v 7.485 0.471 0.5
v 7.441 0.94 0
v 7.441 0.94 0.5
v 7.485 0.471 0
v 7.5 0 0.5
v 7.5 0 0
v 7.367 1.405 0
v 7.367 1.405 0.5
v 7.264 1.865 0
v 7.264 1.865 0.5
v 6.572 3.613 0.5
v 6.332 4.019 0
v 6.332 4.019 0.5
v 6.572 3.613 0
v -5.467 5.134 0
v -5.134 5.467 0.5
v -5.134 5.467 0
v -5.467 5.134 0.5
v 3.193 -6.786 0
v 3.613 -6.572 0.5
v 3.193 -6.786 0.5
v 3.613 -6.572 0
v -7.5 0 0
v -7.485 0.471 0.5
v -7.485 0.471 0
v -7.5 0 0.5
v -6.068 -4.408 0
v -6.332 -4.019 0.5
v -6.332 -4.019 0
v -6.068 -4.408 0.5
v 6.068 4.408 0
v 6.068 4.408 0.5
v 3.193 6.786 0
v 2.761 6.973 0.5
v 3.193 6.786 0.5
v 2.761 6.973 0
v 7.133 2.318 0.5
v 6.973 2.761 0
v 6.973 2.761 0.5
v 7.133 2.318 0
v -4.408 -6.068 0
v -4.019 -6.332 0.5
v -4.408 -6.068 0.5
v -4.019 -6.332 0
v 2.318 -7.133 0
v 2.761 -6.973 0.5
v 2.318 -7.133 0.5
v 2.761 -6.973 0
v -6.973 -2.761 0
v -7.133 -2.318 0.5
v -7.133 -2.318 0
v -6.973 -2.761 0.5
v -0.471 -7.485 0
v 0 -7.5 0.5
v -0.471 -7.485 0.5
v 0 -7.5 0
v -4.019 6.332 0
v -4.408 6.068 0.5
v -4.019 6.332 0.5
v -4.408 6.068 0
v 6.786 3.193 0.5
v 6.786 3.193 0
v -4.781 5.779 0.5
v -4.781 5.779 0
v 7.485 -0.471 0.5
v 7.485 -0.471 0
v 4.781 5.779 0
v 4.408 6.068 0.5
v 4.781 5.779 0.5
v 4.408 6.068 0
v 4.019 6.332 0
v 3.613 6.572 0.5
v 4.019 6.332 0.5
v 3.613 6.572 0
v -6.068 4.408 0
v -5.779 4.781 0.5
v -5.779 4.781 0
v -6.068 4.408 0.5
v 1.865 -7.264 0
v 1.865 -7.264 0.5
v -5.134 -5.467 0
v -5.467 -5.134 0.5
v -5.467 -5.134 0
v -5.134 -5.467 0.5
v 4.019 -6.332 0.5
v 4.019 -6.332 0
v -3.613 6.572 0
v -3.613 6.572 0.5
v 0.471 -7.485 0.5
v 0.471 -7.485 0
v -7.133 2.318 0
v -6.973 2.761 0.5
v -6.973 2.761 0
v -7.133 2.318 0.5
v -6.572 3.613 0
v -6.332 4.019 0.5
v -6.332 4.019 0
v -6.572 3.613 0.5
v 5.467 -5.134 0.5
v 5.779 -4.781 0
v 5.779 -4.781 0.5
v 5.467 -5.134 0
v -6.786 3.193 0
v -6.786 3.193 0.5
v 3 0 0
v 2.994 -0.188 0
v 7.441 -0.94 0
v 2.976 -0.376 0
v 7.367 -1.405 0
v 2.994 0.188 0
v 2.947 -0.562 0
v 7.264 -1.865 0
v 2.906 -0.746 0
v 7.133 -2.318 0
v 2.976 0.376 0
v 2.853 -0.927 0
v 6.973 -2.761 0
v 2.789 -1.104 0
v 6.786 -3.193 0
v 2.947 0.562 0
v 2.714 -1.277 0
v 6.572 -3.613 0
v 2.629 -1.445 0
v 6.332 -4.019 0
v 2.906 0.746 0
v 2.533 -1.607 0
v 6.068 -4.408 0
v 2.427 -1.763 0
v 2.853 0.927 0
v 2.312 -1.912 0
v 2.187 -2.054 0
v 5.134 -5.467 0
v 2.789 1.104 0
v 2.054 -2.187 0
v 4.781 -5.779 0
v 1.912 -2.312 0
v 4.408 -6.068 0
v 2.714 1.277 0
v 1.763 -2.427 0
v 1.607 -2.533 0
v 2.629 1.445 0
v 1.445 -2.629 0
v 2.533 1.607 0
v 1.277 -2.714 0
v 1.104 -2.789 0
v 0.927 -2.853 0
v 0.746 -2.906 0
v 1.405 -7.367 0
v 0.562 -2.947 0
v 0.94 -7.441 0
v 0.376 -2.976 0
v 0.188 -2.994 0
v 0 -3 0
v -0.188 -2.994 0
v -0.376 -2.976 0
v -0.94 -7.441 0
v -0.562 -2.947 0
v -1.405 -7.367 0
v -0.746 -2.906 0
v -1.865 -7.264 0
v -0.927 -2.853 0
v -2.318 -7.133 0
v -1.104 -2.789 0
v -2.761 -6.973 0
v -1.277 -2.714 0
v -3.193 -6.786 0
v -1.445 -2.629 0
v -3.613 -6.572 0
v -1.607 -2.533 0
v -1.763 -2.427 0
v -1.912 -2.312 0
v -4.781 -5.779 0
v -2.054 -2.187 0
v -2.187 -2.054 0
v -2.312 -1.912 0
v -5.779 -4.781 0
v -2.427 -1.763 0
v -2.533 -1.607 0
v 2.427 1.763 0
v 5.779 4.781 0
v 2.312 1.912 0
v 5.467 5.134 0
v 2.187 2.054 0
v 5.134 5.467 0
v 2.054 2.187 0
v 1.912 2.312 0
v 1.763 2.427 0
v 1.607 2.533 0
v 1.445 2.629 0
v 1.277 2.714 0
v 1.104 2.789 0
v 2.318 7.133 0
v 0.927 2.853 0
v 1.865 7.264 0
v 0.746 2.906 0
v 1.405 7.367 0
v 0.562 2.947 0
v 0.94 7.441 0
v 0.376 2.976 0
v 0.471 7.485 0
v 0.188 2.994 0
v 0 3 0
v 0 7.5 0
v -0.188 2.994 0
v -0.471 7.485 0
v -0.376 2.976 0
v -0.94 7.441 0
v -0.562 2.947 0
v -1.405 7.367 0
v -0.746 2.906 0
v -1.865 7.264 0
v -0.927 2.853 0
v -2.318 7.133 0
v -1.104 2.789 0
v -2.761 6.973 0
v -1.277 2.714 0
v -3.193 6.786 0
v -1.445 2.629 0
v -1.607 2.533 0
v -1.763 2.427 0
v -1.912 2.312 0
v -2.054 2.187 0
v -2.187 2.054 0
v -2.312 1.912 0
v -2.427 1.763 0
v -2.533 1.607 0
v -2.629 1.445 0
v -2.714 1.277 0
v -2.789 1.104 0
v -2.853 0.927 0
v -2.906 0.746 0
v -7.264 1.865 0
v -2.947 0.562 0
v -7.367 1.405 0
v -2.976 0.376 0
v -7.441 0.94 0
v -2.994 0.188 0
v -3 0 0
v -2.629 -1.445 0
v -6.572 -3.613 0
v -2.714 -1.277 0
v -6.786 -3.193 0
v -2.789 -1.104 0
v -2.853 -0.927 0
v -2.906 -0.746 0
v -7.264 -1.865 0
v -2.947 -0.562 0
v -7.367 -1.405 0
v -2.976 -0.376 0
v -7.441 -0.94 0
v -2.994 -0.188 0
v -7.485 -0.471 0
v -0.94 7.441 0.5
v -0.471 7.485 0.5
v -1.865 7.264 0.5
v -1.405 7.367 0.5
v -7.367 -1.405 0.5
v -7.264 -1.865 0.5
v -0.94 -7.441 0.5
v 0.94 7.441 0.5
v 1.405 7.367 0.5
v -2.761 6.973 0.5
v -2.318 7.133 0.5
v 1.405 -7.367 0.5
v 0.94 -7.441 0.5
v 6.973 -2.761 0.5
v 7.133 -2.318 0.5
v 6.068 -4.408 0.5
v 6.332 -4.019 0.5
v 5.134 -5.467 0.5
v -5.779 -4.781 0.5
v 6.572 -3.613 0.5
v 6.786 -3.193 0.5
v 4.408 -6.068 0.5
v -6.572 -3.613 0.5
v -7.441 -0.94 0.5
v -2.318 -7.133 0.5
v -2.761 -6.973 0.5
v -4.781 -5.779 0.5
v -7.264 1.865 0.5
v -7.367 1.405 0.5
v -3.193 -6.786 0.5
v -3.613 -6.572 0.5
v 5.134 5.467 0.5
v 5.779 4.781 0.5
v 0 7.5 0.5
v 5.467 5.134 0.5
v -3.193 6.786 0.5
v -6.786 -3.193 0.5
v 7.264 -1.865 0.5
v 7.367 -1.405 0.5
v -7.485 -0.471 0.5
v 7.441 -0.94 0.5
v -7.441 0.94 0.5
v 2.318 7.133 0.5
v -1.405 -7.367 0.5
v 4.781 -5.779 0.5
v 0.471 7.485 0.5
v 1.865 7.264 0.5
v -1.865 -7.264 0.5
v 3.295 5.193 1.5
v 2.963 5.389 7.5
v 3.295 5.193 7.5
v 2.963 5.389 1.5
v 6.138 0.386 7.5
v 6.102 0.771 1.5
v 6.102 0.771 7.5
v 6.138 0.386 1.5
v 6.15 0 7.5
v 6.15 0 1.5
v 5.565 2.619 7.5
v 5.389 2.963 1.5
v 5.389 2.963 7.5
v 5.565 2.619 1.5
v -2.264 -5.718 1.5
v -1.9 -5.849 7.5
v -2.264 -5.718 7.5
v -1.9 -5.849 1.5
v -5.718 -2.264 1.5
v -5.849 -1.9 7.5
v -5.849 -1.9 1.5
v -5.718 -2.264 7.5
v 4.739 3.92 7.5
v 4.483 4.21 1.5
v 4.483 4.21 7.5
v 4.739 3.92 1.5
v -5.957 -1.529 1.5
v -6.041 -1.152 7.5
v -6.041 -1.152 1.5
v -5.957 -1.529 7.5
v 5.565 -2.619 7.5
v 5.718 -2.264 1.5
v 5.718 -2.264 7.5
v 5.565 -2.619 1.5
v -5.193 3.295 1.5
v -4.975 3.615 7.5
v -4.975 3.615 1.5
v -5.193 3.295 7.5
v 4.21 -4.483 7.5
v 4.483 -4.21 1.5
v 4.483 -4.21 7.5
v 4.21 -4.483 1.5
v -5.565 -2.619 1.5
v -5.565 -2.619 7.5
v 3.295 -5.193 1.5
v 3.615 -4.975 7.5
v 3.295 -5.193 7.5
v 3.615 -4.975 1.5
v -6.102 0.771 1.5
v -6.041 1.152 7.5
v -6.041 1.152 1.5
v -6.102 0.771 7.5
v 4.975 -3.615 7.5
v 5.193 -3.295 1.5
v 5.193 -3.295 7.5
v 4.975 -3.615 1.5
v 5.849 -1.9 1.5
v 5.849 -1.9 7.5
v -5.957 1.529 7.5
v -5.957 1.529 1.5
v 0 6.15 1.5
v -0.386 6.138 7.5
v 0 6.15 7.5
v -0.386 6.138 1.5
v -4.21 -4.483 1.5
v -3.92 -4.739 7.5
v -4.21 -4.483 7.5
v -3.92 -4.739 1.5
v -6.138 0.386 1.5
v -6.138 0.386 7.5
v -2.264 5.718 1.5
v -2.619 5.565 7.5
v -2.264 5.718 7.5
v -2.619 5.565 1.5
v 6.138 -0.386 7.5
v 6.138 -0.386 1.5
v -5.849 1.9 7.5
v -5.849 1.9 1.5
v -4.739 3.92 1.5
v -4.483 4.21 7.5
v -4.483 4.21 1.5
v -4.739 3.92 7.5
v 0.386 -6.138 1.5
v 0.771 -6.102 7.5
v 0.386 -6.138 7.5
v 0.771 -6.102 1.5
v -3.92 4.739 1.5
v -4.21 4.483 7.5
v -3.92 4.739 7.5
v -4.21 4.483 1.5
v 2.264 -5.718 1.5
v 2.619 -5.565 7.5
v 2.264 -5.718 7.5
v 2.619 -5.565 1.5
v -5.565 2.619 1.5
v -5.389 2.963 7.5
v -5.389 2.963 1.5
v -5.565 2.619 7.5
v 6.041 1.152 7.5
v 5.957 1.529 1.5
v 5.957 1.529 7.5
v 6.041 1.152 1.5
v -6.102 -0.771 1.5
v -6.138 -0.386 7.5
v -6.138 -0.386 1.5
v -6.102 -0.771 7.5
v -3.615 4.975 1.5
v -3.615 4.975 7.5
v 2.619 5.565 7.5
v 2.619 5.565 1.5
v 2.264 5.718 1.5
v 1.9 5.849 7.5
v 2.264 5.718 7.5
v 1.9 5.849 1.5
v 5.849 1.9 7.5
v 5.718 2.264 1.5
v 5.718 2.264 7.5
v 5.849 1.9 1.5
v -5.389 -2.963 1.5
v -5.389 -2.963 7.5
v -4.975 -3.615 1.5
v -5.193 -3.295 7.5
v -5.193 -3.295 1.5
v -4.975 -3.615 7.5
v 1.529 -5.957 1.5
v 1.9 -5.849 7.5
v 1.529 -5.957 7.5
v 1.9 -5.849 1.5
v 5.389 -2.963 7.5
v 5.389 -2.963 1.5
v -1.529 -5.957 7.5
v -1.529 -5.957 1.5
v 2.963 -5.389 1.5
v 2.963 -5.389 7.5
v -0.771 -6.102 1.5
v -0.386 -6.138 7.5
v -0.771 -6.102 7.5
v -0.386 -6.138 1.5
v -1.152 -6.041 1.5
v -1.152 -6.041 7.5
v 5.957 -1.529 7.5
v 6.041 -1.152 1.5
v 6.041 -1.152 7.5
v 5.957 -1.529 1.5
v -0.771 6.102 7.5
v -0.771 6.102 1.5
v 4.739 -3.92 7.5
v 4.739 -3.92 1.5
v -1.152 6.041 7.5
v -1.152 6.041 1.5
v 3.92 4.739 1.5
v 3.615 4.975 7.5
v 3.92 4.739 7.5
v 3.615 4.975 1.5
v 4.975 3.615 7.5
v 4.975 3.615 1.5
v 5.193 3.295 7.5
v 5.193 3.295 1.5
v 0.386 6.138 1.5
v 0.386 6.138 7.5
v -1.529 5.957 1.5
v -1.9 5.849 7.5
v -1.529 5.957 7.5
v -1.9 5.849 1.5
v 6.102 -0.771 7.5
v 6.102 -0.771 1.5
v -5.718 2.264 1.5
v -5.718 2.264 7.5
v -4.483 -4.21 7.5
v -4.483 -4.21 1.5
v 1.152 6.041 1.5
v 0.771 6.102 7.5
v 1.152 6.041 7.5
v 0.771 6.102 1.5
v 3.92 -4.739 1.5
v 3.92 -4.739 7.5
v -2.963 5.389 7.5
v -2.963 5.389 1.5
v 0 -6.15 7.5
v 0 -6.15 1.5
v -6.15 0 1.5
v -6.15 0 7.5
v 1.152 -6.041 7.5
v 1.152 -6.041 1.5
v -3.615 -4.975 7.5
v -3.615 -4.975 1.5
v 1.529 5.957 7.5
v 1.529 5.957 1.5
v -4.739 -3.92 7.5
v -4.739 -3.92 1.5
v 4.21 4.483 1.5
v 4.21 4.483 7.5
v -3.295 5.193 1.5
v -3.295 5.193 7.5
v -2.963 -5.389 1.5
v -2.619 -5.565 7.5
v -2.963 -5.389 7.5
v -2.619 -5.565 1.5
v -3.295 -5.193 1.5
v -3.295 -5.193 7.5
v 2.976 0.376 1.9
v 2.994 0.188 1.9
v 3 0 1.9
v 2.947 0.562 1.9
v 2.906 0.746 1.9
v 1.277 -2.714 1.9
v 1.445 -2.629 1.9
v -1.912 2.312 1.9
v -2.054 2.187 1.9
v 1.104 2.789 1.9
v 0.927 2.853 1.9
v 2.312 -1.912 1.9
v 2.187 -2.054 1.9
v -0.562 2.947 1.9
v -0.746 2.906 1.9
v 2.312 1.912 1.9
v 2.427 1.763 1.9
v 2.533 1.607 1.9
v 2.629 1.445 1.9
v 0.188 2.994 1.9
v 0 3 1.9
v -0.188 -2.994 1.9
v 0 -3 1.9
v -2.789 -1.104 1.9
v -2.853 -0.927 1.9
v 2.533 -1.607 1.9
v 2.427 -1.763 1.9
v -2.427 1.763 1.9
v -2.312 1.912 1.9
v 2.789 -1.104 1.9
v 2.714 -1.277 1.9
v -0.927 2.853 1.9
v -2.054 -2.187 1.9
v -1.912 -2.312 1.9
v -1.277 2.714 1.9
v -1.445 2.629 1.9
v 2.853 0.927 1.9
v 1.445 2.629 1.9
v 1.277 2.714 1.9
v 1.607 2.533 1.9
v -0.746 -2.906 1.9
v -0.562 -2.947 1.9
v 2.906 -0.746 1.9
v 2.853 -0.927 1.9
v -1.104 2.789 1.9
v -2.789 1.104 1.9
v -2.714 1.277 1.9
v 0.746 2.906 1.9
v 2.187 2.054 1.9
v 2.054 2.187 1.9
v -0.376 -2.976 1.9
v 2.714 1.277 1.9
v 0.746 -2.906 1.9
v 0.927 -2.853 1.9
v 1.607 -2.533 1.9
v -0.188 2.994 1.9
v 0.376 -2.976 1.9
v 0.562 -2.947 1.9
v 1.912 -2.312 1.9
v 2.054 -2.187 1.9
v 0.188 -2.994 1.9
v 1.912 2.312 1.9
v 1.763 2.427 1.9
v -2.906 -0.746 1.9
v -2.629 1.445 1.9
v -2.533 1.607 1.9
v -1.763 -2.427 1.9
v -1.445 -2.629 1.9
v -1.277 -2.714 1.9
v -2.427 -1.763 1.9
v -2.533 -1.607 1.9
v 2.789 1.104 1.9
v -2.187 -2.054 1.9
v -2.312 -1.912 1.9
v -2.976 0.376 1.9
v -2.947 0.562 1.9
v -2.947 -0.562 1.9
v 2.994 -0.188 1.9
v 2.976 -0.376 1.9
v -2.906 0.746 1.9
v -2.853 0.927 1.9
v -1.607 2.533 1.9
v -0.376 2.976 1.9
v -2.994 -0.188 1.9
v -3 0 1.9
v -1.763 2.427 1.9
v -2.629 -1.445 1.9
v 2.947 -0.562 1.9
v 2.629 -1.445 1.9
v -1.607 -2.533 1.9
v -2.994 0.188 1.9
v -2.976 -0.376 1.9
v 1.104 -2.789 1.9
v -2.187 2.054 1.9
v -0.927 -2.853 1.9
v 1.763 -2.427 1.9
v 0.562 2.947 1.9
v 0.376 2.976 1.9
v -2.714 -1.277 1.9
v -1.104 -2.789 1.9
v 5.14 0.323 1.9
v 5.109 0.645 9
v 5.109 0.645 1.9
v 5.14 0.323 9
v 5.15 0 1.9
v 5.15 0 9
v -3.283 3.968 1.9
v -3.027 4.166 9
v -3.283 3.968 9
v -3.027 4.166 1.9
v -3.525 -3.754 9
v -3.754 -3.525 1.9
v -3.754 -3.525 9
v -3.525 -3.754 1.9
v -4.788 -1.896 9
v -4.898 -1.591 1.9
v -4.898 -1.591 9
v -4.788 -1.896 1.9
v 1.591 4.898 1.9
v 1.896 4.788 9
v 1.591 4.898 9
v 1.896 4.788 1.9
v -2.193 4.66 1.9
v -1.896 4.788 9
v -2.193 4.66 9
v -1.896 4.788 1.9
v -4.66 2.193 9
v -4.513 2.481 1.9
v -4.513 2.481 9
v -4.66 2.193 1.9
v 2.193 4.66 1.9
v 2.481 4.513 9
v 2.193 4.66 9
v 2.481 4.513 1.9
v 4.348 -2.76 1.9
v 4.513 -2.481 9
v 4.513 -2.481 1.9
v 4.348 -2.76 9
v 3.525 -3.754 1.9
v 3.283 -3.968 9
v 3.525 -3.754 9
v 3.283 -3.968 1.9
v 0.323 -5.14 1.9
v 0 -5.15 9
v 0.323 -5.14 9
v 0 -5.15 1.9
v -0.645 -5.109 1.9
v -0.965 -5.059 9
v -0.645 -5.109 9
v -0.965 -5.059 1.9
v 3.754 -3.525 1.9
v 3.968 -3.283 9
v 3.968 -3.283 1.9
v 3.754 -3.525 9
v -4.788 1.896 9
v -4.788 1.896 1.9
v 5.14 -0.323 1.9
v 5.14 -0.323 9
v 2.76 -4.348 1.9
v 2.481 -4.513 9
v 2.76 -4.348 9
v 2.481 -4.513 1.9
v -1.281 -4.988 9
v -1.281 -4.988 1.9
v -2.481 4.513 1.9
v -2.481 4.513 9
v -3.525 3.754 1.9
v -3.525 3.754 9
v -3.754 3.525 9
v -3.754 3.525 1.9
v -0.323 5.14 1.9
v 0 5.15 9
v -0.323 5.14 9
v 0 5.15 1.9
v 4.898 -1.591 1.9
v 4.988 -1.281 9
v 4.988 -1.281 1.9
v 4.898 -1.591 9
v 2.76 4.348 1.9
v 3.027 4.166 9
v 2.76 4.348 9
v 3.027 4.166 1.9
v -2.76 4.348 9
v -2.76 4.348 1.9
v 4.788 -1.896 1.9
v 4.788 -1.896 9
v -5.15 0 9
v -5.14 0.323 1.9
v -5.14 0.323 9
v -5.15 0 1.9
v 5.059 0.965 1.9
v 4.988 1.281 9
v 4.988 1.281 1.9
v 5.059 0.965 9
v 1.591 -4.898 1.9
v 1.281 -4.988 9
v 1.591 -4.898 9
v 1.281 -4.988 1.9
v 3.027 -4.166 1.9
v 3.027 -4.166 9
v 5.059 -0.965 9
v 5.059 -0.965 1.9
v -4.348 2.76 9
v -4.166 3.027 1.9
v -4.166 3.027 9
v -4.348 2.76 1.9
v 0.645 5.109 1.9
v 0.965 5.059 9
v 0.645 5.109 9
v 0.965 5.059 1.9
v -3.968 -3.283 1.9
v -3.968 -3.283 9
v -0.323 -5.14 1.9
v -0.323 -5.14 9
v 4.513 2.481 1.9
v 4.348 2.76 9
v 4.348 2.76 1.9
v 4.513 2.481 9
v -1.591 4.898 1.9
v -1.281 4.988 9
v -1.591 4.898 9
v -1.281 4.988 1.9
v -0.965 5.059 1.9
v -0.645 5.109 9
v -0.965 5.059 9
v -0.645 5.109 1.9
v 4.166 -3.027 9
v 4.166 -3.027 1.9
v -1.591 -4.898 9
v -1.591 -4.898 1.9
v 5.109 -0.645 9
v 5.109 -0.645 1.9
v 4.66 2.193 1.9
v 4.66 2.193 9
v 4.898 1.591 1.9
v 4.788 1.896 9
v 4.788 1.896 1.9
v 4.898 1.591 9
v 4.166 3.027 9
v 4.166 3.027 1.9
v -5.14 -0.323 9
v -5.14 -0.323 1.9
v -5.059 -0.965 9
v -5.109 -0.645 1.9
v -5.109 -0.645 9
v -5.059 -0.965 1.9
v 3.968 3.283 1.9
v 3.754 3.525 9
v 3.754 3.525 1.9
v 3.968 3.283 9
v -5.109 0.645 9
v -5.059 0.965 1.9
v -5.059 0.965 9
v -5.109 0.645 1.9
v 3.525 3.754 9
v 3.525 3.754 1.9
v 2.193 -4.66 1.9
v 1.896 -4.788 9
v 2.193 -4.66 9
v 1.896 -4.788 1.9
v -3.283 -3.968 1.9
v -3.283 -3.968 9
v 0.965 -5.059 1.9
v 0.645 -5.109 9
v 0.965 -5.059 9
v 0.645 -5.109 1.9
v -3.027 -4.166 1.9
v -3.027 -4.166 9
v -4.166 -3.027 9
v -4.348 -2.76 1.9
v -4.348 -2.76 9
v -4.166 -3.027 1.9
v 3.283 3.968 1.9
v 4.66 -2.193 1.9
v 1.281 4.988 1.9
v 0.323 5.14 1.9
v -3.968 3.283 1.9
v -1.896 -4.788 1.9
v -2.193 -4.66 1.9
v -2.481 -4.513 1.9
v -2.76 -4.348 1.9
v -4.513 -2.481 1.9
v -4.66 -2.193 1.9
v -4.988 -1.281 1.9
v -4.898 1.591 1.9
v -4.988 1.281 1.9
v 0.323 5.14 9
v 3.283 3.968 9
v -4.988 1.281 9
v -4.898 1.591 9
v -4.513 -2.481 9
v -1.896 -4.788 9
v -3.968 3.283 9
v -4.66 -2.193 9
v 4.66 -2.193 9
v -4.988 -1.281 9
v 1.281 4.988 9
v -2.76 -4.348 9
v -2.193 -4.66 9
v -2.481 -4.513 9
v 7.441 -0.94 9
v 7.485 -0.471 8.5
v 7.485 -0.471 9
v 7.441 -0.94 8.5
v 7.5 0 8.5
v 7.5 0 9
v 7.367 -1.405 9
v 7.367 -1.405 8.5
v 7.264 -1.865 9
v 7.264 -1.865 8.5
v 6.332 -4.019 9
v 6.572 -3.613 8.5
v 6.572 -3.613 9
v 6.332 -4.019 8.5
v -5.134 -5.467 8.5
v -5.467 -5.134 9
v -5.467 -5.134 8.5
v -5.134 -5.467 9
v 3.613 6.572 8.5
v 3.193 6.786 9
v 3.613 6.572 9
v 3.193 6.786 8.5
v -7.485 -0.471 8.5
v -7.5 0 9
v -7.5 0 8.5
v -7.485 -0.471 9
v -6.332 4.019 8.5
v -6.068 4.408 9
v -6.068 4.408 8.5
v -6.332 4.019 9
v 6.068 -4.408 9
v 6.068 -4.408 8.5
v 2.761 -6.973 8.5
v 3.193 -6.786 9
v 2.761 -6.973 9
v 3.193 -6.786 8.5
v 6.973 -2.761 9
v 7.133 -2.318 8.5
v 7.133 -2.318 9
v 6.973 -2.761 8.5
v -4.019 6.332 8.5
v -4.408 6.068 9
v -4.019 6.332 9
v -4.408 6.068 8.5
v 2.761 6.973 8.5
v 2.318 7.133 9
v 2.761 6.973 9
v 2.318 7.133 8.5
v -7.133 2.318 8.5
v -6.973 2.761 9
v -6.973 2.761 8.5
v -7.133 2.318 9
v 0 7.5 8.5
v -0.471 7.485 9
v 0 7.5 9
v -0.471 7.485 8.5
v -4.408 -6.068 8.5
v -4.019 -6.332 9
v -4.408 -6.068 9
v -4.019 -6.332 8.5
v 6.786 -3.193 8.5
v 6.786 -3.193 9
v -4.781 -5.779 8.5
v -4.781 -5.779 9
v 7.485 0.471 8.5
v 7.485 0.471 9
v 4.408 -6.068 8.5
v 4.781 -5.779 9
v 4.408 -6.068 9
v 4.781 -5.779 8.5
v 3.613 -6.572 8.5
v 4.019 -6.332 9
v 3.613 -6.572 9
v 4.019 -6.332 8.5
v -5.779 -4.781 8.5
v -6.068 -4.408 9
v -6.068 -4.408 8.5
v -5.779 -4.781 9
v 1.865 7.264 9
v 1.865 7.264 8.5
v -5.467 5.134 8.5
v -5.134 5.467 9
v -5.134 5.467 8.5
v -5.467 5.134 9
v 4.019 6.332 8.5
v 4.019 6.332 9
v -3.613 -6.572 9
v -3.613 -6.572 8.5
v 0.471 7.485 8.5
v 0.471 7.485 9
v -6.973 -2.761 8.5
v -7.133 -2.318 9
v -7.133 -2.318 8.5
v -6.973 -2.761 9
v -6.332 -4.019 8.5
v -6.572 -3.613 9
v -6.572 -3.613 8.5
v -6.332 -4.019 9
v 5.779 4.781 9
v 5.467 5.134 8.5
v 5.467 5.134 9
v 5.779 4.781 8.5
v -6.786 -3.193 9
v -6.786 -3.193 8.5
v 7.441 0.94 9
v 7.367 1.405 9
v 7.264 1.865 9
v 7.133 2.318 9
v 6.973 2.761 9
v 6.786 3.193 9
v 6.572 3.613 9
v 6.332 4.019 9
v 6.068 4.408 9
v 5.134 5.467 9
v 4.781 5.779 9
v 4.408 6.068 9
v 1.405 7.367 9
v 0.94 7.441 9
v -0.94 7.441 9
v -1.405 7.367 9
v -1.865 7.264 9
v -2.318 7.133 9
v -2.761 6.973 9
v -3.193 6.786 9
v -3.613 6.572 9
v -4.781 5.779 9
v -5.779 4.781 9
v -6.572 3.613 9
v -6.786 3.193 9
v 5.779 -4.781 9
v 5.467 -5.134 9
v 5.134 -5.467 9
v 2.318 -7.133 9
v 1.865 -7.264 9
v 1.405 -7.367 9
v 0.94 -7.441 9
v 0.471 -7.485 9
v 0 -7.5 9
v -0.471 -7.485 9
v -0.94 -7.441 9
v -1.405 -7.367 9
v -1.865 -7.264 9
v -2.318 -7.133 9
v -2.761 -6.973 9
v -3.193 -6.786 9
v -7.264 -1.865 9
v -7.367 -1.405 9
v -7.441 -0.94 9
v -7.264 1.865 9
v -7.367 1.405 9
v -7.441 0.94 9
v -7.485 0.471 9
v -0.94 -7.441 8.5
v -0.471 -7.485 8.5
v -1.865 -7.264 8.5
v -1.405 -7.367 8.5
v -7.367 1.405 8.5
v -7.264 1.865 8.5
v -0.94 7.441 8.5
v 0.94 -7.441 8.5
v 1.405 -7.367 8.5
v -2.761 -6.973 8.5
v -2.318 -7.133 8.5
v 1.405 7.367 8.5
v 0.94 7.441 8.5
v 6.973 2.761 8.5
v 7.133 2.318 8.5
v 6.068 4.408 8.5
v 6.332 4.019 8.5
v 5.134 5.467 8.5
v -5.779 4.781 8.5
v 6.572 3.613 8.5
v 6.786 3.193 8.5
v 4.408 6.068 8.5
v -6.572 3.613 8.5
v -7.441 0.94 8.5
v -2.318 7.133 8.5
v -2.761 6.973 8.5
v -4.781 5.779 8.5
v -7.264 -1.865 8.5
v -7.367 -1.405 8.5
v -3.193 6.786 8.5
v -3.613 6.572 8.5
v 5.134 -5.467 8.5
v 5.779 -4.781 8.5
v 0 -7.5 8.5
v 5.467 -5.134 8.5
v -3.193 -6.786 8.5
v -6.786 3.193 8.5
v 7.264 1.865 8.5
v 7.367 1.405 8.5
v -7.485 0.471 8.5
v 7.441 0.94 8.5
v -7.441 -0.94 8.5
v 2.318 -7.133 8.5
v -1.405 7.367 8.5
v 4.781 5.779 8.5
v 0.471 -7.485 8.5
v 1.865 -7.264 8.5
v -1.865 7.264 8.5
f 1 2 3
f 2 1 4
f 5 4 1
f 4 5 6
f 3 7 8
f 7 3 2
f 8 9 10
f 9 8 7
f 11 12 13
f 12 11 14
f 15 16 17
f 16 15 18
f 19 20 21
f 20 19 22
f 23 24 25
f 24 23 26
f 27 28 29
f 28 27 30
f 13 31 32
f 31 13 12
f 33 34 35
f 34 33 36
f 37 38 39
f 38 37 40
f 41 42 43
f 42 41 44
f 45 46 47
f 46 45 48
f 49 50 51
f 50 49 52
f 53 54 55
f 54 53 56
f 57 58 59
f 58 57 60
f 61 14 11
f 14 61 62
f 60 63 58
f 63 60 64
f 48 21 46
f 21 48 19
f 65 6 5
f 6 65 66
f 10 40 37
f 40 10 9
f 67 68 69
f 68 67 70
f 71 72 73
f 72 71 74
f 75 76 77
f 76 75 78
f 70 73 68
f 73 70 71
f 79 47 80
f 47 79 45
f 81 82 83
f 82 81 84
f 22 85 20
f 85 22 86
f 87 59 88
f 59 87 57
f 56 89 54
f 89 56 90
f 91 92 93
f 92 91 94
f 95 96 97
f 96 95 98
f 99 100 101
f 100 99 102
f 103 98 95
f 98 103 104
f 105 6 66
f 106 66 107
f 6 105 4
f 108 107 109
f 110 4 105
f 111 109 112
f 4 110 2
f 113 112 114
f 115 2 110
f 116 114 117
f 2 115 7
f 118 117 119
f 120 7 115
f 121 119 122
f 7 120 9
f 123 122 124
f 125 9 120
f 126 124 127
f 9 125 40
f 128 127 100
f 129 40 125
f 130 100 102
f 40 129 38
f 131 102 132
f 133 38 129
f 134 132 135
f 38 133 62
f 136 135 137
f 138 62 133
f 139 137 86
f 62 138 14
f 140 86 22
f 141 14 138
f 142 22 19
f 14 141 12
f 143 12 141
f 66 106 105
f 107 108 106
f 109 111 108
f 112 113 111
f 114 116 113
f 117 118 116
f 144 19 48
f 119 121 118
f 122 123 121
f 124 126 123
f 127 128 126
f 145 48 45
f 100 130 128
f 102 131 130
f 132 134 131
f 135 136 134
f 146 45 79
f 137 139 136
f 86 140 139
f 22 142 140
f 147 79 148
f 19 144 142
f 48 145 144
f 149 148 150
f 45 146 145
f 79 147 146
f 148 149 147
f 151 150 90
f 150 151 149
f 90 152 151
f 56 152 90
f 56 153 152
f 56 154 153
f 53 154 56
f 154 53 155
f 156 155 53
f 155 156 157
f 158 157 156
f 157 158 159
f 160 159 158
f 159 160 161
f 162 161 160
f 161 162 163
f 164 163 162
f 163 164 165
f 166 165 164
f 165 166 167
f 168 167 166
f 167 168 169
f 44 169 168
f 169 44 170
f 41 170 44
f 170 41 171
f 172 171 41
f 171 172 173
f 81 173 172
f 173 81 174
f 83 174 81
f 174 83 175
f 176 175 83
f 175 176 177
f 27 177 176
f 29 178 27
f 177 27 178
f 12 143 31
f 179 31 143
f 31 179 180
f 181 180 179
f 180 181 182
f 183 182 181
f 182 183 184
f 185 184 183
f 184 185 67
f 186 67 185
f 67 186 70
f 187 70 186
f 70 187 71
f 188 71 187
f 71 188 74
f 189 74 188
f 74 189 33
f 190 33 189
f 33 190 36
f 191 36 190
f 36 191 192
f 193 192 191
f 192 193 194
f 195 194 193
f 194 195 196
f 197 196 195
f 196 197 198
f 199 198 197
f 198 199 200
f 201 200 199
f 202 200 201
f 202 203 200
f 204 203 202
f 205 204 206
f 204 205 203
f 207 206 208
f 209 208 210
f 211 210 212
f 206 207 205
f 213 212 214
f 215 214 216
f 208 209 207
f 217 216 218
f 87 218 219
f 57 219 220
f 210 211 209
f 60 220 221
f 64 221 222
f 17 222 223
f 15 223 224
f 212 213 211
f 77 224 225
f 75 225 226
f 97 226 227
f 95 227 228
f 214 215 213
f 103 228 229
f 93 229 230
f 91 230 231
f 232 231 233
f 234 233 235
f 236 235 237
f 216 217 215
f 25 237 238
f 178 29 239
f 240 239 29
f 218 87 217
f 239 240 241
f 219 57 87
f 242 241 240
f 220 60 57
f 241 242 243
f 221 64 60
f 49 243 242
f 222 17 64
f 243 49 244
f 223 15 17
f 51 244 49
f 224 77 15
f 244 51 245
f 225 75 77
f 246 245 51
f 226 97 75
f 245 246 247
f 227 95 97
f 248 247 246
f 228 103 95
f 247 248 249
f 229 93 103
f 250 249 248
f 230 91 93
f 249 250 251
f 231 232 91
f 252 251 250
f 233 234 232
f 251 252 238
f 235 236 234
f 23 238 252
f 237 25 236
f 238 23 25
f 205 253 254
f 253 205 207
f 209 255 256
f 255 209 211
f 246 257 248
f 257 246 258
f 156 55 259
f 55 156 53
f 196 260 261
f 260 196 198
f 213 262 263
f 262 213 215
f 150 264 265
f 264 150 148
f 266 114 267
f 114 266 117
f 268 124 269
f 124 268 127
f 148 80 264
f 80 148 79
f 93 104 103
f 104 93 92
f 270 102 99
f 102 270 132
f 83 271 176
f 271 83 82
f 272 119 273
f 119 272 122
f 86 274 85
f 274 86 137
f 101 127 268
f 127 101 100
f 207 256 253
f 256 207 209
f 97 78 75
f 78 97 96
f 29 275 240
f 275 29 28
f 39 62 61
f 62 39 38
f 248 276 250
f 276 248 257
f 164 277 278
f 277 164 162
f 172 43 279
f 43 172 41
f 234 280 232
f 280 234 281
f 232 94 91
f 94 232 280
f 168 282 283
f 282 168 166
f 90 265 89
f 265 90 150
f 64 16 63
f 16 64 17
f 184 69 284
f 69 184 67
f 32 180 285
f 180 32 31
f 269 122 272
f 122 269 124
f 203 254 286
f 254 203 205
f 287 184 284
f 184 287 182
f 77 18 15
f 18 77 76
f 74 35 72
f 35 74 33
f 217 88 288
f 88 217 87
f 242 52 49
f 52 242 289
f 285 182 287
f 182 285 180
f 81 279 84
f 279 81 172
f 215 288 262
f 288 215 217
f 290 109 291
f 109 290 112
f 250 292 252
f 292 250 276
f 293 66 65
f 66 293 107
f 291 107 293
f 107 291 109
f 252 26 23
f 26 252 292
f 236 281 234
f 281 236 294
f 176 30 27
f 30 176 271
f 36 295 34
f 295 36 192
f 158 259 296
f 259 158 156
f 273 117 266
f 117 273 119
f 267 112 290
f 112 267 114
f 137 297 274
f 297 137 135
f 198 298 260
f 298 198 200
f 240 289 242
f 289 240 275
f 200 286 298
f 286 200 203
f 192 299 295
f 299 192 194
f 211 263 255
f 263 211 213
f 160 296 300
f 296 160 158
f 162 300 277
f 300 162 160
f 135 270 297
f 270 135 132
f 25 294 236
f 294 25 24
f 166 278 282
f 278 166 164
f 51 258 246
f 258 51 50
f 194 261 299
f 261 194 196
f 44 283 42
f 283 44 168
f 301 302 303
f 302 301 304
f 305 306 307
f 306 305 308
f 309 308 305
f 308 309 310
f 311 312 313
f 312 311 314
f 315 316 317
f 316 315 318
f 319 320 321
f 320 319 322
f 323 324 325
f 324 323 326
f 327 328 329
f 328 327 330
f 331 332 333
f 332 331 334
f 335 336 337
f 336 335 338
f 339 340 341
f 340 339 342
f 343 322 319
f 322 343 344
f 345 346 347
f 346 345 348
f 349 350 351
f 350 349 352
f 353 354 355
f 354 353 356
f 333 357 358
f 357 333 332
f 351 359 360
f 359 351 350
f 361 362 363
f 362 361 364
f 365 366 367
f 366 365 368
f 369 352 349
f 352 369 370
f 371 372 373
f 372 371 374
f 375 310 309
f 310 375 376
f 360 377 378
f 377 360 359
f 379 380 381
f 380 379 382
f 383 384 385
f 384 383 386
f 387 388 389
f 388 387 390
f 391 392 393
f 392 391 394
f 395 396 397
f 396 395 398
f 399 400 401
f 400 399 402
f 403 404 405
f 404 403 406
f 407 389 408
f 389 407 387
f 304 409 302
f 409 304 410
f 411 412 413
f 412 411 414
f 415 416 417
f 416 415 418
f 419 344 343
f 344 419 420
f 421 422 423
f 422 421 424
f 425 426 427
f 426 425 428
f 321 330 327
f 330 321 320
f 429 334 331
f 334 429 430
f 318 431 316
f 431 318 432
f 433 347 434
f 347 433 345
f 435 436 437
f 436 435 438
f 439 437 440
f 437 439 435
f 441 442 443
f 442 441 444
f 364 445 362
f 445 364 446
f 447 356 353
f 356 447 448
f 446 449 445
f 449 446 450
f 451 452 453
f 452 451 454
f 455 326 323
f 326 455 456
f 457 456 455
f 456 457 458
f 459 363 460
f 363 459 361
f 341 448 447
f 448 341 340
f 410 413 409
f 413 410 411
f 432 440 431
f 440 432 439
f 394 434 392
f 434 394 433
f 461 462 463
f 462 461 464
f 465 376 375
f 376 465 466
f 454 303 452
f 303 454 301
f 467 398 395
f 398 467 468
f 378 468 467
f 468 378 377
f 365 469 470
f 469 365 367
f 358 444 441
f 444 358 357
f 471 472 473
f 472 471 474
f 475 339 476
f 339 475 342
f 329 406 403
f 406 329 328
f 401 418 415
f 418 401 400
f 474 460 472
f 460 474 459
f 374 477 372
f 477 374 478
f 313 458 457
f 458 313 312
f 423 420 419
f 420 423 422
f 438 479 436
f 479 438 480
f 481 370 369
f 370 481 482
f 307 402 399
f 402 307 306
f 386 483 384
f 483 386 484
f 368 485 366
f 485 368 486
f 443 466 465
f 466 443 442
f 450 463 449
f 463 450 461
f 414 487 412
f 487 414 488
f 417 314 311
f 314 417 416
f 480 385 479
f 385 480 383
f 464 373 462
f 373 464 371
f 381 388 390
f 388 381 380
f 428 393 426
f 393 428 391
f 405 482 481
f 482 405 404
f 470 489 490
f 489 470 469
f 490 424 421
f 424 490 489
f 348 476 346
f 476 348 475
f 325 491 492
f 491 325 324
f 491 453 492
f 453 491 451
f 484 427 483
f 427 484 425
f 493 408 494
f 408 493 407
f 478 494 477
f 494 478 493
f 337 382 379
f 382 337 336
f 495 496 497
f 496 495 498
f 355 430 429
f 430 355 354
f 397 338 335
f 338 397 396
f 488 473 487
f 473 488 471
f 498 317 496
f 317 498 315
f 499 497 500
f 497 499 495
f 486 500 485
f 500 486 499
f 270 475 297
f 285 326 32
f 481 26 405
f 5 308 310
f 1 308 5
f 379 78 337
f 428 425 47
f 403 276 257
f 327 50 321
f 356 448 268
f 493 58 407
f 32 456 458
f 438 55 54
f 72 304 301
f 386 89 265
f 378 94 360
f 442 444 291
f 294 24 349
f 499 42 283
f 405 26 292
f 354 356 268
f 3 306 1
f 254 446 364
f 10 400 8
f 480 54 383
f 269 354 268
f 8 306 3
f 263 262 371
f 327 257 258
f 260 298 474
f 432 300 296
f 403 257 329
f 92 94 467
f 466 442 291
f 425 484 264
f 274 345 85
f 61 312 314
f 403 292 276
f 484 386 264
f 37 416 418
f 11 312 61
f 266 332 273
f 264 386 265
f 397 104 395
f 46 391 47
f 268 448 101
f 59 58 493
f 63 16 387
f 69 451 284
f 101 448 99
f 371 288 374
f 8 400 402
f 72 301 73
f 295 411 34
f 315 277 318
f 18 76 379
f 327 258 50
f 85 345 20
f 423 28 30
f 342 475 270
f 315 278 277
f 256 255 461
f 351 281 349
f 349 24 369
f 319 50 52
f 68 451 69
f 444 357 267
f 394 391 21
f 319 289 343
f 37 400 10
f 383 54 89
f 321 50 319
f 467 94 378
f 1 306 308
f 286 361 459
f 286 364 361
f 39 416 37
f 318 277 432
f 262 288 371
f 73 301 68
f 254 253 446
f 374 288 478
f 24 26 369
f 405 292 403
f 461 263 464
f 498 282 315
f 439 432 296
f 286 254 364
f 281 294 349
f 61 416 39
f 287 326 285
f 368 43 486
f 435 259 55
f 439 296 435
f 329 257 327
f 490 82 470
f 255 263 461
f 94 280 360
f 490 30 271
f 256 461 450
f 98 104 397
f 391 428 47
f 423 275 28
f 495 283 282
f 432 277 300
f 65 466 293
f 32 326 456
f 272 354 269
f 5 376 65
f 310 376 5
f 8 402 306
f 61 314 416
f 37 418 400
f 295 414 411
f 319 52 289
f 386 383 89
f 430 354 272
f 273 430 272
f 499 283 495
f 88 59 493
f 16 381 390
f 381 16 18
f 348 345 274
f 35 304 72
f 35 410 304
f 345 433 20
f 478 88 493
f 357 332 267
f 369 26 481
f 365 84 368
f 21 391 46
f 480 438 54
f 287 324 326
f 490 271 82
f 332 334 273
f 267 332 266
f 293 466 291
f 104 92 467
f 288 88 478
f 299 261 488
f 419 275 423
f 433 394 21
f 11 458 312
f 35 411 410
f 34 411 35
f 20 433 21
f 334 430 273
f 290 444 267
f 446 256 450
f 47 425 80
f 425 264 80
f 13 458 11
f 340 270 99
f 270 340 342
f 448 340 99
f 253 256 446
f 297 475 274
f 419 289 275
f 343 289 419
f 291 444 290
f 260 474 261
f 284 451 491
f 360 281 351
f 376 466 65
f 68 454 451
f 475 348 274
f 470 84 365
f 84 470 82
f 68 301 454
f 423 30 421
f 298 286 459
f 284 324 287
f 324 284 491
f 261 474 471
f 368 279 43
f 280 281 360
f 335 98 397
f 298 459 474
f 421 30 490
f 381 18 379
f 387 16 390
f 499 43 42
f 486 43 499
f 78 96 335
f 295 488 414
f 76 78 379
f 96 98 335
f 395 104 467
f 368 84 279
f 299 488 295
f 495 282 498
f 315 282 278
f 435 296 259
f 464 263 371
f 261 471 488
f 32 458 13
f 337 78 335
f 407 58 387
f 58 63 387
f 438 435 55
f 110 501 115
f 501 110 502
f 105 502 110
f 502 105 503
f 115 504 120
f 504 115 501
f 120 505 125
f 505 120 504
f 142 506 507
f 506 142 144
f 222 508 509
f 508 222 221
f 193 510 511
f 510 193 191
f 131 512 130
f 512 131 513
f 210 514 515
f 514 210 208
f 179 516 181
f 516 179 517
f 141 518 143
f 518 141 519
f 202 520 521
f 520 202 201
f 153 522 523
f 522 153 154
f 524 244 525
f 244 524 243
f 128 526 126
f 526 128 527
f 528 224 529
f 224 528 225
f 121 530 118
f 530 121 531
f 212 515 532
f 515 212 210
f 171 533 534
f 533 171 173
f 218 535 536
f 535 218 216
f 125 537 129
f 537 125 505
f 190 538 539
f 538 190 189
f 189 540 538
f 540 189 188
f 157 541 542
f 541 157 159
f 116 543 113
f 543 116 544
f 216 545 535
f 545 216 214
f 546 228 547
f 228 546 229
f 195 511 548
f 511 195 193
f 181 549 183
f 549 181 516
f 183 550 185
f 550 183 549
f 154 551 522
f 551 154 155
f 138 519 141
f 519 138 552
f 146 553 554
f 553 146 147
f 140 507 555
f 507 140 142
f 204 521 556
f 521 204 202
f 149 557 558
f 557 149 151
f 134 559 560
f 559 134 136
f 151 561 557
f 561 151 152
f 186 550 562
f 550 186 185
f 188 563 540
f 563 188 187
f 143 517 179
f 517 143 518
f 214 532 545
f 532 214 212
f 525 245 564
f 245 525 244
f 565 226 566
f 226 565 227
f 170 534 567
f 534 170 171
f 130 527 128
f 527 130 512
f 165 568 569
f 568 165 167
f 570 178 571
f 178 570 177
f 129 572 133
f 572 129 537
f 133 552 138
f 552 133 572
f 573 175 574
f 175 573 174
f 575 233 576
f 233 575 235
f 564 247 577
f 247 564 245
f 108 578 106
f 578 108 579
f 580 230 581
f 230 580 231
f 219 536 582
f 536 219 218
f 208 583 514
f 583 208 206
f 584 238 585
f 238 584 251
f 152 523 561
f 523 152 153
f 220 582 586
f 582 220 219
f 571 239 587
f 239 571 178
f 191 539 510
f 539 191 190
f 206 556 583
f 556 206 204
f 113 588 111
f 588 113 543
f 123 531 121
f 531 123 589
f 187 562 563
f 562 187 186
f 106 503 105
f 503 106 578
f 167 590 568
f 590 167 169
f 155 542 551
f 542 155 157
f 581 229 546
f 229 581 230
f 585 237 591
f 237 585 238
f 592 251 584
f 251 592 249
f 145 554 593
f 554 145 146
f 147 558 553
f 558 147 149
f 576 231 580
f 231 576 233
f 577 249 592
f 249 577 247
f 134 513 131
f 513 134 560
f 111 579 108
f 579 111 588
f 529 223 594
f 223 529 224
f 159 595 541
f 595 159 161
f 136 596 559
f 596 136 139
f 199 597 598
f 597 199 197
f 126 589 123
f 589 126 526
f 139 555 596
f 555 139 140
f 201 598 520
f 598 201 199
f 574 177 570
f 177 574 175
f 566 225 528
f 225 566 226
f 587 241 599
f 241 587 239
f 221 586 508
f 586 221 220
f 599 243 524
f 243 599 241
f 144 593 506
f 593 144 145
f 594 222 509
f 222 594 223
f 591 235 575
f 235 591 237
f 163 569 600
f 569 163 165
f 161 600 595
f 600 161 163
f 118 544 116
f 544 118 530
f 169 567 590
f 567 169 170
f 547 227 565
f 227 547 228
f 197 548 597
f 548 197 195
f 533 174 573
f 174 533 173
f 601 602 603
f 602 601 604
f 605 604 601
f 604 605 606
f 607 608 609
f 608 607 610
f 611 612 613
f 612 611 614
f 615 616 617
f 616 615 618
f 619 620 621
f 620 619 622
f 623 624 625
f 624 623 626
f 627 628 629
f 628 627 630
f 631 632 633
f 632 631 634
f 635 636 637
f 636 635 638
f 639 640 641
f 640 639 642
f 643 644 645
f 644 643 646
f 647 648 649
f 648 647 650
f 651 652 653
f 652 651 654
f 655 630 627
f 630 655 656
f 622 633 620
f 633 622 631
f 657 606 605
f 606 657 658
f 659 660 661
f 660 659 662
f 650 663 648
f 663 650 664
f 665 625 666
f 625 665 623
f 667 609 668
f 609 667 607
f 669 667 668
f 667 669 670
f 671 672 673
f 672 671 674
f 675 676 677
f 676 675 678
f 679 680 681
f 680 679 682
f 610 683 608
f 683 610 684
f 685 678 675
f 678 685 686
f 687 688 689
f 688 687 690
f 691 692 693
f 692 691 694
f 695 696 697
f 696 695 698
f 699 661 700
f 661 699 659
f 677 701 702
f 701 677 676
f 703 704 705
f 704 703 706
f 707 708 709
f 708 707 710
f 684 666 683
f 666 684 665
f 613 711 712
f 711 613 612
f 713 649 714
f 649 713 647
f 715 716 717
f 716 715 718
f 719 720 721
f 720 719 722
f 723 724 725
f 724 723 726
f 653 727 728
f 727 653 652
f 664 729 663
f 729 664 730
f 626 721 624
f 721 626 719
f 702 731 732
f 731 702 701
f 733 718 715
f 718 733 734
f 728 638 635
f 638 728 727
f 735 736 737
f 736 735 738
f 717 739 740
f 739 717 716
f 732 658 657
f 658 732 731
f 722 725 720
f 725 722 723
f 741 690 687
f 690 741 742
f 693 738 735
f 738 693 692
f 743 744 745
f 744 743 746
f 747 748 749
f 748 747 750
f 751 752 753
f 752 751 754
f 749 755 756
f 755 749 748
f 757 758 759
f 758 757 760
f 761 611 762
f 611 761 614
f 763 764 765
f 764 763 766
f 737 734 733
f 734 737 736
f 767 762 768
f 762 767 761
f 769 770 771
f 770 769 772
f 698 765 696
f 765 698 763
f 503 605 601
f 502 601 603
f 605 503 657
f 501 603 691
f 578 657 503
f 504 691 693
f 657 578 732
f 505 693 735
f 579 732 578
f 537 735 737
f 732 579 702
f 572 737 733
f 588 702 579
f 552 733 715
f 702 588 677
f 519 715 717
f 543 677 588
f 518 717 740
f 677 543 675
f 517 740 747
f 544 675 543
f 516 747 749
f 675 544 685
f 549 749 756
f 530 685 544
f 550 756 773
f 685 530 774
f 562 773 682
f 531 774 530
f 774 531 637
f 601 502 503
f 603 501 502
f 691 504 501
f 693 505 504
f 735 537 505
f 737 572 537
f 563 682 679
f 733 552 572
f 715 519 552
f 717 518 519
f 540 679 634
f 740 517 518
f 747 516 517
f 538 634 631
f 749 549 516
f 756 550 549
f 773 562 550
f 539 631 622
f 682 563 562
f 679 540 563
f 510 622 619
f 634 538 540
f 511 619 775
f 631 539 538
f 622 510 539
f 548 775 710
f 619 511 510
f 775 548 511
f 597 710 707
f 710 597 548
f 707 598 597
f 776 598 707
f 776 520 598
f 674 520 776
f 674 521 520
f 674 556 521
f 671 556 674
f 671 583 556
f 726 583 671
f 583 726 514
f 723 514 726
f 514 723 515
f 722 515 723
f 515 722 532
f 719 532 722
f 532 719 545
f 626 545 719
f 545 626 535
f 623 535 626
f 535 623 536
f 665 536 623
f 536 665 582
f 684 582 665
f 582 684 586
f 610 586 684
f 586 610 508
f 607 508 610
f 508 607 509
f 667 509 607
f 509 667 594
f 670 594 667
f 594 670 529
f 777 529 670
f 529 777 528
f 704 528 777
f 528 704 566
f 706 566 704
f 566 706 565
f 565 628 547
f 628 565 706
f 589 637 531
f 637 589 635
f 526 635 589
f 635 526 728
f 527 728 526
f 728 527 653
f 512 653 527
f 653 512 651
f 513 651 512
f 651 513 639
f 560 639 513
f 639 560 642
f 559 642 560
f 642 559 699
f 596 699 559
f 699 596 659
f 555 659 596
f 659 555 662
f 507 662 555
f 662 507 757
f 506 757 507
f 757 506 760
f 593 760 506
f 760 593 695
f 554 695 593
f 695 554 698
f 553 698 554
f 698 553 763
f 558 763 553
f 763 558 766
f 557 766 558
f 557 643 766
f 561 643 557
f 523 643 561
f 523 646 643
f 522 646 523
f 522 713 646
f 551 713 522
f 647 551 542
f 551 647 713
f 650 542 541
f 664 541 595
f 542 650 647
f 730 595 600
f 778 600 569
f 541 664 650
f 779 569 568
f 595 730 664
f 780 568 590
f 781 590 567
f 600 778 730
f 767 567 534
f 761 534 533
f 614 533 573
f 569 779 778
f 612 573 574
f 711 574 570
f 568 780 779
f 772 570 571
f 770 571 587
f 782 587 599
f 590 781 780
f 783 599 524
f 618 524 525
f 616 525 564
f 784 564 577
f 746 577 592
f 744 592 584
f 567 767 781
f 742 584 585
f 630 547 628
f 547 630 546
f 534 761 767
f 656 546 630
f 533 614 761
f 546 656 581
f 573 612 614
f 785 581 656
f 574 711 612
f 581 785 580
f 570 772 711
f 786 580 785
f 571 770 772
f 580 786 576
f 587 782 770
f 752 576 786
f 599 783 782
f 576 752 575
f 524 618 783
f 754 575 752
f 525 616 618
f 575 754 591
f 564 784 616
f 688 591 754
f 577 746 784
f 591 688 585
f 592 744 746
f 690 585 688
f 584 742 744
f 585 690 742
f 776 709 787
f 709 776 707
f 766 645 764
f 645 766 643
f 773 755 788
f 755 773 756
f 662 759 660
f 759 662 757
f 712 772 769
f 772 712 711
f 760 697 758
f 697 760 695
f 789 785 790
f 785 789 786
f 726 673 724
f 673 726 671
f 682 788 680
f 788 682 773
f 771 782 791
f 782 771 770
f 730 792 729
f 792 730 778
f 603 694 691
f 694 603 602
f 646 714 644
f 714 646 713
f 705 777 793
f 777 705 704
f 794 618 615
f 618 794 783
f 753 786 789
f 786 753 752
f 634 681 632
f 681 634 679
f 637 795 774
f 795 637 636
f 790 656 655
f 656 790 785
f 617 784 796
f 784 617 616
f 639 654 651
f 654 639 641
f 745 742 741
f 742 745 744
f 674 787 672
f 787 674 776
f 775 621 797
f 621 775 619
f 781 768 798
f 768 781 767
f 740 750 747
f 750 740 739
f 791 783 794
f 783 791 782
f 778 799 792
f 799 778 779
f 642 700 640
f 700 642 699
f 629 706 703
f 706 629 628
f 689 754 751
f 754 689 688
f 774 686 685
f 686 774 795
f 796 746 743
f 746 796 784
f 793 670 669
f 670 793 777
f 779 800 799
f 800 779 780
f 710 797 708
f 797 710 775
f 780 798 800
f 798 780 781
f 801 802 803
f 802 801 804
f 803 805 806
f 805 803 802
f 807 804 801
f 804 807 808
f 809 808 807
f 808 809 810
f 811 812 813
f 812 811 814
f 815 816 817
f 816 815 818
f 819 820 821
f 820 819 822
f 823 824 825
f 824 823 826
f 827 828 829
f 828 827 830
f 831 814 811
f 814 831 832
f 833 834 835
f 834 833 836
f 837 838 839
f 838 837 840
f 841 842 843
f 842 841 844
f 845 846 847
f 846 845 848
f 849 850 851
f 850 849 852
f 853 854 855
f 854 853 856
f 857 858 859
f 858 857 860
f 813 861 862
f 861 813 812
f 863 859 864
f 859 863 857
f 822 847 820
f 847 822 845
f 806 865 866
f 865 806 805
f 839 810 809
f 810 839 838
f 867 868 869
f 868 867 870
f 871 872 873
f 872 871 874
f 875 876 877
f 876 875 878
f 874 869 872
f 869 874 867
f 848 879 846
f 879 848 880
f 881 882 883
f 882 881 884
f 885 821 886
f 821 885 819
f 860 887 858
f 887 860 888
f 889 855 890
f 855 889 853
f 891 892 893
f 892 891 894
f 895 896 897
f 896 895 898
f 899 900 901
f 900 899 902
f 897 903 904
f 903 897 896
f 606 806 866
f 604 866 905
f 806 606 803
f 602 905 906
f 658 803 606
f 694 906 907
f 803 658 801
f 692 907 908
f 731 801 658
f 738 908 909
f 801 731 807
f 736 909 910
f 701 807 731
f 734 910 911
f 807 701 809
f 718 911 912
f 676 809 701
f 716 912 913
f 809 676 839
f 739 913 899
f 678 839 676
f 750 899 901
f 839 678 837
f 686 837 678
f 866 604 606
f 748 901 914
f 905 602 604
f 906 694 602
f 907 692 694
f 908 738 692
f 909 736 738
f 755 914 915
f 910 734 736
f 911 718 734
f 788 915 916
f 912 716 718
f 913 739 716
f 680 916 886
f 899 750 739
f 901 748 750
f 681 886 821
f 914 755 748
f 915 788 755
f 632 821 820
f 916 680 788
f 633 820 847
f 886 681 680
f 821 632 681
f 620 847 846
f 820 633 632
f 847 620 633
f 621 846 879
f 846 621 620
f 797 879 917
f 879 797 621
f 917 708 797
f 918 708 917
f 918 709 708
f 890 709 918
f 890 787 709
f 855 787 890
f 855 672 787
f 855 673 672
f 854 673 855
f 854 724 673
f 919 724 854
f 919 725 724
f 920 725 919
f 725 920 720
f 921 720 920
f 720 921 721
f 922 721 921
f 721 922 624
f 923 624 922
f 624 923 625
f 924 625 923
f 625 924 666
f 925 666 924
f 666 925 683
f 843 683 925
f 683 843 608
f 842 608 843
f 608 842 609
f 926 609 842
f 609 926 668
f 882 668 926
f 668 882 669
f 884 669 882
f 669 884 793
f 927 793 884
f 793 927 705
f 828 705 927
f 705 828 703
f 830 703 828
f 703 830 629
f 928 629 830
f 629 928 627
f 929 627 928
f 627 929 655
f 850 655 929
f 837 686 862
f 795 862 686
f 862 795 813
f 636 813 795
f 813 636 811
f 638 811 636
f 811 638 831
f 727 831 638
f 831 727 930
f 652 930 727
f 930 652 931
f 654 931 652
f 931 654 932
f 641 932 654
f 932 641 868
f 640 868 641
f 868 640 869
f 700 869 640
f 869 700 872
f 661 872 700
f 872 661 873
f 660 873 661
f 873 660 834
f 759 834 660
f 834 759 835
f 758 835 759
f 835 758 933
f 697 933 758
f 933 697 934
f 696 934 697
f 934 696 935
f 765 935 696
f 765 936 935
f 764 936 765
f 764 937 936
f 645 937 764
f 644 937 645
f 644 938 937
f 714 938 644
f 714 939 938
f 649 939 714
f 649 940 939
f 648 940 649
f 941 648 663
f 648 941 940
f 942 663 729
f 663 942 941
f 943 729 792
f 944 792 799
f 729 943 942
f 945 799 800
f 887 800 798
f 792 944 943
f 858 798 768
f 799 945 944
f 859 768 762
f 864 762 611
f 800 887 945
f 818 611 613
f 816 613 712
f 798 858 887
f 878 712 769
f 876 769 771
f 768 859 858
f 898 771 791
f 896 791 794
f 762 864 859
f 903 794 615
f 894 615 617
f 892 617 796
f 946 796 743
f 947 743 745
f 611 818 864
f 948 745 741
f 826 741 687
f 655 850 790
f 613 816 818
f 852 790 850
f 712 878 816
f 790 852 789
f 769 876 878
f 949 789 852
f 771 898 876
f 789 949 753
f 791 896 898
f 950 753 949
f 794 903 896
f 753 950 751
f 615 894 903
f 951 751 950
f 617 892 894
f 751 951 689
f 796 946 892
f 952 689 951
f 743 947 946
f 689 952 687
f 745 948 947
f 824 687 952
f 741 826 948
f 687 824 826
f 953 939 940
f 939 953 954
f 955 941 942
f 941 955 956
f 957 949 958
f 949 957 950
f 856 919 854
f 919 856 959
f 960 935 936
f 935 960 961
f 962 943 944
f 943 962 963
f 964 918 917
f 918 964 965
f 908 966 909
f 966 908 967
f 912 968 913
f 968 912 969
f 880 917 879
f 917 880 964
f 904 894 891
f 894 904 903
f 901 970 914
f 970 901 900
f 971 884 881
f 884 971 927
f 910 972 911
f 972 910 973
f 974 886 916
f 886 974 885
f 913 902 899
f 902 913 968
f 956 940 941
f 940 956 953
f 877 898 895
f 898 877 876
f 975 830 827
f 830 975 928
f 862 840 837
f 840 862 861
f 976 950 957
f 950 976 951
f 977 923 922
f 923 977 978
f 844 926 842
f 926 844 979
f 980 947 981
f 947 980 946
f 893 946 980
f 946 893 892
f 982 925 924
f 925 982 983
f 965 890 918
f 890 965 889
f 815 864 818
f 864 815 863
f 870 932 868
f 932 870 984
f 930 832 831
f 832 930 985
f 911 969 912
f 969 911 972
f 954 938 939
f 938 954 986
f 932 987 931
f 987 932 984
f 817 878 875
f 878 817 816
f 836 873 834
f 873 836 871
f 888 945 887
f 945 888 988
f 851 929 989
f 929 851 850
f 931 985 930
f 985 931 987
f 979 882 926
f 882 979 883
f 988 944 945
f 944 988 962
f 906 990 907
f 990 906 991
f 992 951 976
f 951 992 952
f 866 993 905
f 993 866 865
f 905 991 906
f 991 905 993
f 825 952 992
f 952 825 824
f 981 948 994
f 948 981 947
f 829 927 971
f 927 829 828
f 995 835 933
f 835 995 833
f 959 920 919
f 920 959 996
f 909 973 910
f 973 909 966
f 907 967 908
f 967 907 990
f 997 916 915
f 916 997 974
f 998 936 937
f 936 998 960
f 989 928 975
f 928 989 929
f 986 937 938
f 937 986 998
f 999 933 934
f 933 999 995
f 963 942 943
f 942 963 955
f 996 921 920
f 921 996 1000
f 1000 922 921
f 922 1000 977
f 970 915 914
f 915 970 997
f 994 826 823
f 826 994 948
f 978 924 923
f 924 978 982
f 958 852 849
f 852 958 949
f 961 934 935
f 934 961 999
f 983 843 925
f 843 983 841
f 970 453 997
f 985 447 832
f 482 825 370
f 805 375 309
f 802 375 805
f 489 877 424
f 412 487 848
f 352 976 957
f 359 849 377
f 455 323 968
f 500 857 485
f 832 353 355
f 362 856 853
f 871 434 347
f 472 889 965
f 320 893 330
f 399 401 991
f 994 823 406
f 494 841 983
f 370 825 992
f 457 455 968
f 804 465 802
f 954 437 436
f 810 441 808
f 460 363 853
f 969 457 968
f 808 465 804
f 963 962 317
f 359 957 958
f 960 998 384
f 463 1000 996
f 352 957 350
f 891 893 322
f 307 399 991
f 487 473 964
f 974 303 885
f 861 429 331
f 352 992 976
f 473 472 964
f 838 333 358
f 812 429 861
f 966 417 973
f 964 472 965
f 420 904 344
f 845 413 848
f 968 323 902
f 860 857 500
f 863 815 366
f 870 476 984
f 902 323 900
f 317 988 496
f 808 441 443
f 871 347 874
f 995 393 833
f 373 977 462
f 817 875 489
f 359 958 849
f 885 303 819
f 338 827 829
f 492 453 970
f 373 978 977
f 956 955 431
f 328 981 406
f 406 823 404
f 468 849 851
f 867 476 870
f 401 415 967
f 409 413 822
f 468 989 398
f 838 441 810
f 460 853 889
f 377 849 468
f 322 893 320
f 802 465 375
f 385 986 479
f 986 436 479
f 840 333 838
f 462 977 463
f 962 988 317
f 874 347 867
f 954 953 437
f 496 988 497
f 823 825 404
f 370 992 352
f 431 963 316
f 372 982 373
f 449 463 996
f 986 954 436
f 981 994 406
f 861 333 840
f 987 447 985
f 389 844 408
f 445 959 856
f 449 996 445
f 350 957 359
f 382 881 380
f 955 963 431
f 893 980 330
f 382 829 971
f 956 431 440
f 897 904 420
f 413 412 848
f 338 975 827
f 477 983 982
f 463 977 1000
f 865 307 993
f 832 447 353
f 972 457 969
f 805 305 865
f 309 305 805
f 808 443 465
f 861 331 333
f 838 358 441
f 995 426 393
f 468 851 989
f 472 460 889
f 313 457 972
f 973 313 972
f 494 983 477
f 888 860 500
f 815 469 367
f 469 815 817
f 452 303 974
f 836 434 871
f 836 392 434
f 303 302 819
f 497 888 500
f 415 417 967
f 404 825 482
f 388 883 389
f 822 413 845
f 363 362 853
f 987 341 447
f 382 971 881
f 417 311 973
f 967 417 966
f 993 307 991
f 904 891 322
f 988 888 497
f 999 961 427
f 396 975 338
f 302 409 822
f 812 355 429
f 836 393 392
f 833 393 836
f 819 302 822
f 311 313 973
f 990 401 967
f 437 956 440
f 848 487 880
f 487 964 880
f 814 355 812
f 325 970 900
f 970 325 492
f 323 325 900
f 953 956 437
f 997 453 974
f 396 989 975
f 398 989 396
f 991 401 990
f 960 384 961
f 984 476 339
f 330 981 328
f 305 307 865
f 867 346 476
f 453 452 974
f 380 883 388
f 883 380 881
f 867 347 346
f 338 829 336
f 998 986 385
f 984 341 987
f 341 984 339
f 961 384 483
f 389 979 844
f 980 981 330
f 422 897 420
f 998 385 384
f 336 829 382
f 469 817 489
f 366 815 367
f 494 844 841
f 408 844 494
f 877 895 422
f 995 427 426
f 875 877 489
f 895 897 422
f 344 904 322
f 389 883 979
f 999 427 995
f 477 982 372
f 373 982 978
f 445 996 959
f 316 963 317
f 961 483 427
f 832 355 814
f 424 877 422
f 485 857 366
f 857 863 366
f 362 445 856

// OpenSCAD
// Created from Code_Pulley_623 (x4).stl
// https://github.com/Mecan0/Code
// By J.Rodigo (www.jra.so)
// Licence Creative commons atribution & share alike.

/**************************/
// Parámetros de la pieza  /
/**************************/

dCoji	= 10.3 ;// Diámetro  del cojinete (10.3)
hPolea	= 1 ;	// Anchura de la pared de la polea (Normal = 1) (Strong = 2)
hCoji	= 5.2 ;	// Anchura del cojinete (5.2)
dEje	= 6 ;	// Diámetro del eje (6)
dPolea	= 15 ;	// Diámetro externo de la polea (Normal = 15) (Strong = 17)
hCorrea = 6 ;	// Anchura de la correa (6)

// Media polea para un cojinete
module Polea(){
	difference () {
		union() {
			// Cilindro - Base
			cylinder (h = 0.5, r = dPolea/2, $fn=100);
			// Cilindro - Canal para la correa
			translate([0, 0, 0.5])
			cylinder (h = 4, r = (dCoji/2)+hPolea, $fn=100);
			//	Chaflán entre la Base y el Canal
			translate([0, 0, 0.5])
			cylinder(h = 4-(hCorrea/2), r1 = dPolea/2, r2 = (dCoji/2)+hPolea, $fn=100);
		}	
		union() {
			// Taladro del eje
			translate([0, 0, -1])
			cylinder (h = 5, r = dEje/2, $fn=100);
			// Taladro del cojinete
			translate([0, 0, 4.5-hCoji/2])
			cylinder (h = 5, r = dCoji/2, $fn=100);
		}	
	 
	}
}

// Generamos la mitad de la polea

	Polea();
	
// Generamos la otra mitad de la polea
	difference(){
		// Trasladada y rotada
		translate([0, 0, 9])
		rotate([180, 0, 0])
		Polea();
		// Obertura para el cojinete
		translate([0, 0, 3])
		cylinder (h = 8, r = dCoji/2, $fn=100);
	}
